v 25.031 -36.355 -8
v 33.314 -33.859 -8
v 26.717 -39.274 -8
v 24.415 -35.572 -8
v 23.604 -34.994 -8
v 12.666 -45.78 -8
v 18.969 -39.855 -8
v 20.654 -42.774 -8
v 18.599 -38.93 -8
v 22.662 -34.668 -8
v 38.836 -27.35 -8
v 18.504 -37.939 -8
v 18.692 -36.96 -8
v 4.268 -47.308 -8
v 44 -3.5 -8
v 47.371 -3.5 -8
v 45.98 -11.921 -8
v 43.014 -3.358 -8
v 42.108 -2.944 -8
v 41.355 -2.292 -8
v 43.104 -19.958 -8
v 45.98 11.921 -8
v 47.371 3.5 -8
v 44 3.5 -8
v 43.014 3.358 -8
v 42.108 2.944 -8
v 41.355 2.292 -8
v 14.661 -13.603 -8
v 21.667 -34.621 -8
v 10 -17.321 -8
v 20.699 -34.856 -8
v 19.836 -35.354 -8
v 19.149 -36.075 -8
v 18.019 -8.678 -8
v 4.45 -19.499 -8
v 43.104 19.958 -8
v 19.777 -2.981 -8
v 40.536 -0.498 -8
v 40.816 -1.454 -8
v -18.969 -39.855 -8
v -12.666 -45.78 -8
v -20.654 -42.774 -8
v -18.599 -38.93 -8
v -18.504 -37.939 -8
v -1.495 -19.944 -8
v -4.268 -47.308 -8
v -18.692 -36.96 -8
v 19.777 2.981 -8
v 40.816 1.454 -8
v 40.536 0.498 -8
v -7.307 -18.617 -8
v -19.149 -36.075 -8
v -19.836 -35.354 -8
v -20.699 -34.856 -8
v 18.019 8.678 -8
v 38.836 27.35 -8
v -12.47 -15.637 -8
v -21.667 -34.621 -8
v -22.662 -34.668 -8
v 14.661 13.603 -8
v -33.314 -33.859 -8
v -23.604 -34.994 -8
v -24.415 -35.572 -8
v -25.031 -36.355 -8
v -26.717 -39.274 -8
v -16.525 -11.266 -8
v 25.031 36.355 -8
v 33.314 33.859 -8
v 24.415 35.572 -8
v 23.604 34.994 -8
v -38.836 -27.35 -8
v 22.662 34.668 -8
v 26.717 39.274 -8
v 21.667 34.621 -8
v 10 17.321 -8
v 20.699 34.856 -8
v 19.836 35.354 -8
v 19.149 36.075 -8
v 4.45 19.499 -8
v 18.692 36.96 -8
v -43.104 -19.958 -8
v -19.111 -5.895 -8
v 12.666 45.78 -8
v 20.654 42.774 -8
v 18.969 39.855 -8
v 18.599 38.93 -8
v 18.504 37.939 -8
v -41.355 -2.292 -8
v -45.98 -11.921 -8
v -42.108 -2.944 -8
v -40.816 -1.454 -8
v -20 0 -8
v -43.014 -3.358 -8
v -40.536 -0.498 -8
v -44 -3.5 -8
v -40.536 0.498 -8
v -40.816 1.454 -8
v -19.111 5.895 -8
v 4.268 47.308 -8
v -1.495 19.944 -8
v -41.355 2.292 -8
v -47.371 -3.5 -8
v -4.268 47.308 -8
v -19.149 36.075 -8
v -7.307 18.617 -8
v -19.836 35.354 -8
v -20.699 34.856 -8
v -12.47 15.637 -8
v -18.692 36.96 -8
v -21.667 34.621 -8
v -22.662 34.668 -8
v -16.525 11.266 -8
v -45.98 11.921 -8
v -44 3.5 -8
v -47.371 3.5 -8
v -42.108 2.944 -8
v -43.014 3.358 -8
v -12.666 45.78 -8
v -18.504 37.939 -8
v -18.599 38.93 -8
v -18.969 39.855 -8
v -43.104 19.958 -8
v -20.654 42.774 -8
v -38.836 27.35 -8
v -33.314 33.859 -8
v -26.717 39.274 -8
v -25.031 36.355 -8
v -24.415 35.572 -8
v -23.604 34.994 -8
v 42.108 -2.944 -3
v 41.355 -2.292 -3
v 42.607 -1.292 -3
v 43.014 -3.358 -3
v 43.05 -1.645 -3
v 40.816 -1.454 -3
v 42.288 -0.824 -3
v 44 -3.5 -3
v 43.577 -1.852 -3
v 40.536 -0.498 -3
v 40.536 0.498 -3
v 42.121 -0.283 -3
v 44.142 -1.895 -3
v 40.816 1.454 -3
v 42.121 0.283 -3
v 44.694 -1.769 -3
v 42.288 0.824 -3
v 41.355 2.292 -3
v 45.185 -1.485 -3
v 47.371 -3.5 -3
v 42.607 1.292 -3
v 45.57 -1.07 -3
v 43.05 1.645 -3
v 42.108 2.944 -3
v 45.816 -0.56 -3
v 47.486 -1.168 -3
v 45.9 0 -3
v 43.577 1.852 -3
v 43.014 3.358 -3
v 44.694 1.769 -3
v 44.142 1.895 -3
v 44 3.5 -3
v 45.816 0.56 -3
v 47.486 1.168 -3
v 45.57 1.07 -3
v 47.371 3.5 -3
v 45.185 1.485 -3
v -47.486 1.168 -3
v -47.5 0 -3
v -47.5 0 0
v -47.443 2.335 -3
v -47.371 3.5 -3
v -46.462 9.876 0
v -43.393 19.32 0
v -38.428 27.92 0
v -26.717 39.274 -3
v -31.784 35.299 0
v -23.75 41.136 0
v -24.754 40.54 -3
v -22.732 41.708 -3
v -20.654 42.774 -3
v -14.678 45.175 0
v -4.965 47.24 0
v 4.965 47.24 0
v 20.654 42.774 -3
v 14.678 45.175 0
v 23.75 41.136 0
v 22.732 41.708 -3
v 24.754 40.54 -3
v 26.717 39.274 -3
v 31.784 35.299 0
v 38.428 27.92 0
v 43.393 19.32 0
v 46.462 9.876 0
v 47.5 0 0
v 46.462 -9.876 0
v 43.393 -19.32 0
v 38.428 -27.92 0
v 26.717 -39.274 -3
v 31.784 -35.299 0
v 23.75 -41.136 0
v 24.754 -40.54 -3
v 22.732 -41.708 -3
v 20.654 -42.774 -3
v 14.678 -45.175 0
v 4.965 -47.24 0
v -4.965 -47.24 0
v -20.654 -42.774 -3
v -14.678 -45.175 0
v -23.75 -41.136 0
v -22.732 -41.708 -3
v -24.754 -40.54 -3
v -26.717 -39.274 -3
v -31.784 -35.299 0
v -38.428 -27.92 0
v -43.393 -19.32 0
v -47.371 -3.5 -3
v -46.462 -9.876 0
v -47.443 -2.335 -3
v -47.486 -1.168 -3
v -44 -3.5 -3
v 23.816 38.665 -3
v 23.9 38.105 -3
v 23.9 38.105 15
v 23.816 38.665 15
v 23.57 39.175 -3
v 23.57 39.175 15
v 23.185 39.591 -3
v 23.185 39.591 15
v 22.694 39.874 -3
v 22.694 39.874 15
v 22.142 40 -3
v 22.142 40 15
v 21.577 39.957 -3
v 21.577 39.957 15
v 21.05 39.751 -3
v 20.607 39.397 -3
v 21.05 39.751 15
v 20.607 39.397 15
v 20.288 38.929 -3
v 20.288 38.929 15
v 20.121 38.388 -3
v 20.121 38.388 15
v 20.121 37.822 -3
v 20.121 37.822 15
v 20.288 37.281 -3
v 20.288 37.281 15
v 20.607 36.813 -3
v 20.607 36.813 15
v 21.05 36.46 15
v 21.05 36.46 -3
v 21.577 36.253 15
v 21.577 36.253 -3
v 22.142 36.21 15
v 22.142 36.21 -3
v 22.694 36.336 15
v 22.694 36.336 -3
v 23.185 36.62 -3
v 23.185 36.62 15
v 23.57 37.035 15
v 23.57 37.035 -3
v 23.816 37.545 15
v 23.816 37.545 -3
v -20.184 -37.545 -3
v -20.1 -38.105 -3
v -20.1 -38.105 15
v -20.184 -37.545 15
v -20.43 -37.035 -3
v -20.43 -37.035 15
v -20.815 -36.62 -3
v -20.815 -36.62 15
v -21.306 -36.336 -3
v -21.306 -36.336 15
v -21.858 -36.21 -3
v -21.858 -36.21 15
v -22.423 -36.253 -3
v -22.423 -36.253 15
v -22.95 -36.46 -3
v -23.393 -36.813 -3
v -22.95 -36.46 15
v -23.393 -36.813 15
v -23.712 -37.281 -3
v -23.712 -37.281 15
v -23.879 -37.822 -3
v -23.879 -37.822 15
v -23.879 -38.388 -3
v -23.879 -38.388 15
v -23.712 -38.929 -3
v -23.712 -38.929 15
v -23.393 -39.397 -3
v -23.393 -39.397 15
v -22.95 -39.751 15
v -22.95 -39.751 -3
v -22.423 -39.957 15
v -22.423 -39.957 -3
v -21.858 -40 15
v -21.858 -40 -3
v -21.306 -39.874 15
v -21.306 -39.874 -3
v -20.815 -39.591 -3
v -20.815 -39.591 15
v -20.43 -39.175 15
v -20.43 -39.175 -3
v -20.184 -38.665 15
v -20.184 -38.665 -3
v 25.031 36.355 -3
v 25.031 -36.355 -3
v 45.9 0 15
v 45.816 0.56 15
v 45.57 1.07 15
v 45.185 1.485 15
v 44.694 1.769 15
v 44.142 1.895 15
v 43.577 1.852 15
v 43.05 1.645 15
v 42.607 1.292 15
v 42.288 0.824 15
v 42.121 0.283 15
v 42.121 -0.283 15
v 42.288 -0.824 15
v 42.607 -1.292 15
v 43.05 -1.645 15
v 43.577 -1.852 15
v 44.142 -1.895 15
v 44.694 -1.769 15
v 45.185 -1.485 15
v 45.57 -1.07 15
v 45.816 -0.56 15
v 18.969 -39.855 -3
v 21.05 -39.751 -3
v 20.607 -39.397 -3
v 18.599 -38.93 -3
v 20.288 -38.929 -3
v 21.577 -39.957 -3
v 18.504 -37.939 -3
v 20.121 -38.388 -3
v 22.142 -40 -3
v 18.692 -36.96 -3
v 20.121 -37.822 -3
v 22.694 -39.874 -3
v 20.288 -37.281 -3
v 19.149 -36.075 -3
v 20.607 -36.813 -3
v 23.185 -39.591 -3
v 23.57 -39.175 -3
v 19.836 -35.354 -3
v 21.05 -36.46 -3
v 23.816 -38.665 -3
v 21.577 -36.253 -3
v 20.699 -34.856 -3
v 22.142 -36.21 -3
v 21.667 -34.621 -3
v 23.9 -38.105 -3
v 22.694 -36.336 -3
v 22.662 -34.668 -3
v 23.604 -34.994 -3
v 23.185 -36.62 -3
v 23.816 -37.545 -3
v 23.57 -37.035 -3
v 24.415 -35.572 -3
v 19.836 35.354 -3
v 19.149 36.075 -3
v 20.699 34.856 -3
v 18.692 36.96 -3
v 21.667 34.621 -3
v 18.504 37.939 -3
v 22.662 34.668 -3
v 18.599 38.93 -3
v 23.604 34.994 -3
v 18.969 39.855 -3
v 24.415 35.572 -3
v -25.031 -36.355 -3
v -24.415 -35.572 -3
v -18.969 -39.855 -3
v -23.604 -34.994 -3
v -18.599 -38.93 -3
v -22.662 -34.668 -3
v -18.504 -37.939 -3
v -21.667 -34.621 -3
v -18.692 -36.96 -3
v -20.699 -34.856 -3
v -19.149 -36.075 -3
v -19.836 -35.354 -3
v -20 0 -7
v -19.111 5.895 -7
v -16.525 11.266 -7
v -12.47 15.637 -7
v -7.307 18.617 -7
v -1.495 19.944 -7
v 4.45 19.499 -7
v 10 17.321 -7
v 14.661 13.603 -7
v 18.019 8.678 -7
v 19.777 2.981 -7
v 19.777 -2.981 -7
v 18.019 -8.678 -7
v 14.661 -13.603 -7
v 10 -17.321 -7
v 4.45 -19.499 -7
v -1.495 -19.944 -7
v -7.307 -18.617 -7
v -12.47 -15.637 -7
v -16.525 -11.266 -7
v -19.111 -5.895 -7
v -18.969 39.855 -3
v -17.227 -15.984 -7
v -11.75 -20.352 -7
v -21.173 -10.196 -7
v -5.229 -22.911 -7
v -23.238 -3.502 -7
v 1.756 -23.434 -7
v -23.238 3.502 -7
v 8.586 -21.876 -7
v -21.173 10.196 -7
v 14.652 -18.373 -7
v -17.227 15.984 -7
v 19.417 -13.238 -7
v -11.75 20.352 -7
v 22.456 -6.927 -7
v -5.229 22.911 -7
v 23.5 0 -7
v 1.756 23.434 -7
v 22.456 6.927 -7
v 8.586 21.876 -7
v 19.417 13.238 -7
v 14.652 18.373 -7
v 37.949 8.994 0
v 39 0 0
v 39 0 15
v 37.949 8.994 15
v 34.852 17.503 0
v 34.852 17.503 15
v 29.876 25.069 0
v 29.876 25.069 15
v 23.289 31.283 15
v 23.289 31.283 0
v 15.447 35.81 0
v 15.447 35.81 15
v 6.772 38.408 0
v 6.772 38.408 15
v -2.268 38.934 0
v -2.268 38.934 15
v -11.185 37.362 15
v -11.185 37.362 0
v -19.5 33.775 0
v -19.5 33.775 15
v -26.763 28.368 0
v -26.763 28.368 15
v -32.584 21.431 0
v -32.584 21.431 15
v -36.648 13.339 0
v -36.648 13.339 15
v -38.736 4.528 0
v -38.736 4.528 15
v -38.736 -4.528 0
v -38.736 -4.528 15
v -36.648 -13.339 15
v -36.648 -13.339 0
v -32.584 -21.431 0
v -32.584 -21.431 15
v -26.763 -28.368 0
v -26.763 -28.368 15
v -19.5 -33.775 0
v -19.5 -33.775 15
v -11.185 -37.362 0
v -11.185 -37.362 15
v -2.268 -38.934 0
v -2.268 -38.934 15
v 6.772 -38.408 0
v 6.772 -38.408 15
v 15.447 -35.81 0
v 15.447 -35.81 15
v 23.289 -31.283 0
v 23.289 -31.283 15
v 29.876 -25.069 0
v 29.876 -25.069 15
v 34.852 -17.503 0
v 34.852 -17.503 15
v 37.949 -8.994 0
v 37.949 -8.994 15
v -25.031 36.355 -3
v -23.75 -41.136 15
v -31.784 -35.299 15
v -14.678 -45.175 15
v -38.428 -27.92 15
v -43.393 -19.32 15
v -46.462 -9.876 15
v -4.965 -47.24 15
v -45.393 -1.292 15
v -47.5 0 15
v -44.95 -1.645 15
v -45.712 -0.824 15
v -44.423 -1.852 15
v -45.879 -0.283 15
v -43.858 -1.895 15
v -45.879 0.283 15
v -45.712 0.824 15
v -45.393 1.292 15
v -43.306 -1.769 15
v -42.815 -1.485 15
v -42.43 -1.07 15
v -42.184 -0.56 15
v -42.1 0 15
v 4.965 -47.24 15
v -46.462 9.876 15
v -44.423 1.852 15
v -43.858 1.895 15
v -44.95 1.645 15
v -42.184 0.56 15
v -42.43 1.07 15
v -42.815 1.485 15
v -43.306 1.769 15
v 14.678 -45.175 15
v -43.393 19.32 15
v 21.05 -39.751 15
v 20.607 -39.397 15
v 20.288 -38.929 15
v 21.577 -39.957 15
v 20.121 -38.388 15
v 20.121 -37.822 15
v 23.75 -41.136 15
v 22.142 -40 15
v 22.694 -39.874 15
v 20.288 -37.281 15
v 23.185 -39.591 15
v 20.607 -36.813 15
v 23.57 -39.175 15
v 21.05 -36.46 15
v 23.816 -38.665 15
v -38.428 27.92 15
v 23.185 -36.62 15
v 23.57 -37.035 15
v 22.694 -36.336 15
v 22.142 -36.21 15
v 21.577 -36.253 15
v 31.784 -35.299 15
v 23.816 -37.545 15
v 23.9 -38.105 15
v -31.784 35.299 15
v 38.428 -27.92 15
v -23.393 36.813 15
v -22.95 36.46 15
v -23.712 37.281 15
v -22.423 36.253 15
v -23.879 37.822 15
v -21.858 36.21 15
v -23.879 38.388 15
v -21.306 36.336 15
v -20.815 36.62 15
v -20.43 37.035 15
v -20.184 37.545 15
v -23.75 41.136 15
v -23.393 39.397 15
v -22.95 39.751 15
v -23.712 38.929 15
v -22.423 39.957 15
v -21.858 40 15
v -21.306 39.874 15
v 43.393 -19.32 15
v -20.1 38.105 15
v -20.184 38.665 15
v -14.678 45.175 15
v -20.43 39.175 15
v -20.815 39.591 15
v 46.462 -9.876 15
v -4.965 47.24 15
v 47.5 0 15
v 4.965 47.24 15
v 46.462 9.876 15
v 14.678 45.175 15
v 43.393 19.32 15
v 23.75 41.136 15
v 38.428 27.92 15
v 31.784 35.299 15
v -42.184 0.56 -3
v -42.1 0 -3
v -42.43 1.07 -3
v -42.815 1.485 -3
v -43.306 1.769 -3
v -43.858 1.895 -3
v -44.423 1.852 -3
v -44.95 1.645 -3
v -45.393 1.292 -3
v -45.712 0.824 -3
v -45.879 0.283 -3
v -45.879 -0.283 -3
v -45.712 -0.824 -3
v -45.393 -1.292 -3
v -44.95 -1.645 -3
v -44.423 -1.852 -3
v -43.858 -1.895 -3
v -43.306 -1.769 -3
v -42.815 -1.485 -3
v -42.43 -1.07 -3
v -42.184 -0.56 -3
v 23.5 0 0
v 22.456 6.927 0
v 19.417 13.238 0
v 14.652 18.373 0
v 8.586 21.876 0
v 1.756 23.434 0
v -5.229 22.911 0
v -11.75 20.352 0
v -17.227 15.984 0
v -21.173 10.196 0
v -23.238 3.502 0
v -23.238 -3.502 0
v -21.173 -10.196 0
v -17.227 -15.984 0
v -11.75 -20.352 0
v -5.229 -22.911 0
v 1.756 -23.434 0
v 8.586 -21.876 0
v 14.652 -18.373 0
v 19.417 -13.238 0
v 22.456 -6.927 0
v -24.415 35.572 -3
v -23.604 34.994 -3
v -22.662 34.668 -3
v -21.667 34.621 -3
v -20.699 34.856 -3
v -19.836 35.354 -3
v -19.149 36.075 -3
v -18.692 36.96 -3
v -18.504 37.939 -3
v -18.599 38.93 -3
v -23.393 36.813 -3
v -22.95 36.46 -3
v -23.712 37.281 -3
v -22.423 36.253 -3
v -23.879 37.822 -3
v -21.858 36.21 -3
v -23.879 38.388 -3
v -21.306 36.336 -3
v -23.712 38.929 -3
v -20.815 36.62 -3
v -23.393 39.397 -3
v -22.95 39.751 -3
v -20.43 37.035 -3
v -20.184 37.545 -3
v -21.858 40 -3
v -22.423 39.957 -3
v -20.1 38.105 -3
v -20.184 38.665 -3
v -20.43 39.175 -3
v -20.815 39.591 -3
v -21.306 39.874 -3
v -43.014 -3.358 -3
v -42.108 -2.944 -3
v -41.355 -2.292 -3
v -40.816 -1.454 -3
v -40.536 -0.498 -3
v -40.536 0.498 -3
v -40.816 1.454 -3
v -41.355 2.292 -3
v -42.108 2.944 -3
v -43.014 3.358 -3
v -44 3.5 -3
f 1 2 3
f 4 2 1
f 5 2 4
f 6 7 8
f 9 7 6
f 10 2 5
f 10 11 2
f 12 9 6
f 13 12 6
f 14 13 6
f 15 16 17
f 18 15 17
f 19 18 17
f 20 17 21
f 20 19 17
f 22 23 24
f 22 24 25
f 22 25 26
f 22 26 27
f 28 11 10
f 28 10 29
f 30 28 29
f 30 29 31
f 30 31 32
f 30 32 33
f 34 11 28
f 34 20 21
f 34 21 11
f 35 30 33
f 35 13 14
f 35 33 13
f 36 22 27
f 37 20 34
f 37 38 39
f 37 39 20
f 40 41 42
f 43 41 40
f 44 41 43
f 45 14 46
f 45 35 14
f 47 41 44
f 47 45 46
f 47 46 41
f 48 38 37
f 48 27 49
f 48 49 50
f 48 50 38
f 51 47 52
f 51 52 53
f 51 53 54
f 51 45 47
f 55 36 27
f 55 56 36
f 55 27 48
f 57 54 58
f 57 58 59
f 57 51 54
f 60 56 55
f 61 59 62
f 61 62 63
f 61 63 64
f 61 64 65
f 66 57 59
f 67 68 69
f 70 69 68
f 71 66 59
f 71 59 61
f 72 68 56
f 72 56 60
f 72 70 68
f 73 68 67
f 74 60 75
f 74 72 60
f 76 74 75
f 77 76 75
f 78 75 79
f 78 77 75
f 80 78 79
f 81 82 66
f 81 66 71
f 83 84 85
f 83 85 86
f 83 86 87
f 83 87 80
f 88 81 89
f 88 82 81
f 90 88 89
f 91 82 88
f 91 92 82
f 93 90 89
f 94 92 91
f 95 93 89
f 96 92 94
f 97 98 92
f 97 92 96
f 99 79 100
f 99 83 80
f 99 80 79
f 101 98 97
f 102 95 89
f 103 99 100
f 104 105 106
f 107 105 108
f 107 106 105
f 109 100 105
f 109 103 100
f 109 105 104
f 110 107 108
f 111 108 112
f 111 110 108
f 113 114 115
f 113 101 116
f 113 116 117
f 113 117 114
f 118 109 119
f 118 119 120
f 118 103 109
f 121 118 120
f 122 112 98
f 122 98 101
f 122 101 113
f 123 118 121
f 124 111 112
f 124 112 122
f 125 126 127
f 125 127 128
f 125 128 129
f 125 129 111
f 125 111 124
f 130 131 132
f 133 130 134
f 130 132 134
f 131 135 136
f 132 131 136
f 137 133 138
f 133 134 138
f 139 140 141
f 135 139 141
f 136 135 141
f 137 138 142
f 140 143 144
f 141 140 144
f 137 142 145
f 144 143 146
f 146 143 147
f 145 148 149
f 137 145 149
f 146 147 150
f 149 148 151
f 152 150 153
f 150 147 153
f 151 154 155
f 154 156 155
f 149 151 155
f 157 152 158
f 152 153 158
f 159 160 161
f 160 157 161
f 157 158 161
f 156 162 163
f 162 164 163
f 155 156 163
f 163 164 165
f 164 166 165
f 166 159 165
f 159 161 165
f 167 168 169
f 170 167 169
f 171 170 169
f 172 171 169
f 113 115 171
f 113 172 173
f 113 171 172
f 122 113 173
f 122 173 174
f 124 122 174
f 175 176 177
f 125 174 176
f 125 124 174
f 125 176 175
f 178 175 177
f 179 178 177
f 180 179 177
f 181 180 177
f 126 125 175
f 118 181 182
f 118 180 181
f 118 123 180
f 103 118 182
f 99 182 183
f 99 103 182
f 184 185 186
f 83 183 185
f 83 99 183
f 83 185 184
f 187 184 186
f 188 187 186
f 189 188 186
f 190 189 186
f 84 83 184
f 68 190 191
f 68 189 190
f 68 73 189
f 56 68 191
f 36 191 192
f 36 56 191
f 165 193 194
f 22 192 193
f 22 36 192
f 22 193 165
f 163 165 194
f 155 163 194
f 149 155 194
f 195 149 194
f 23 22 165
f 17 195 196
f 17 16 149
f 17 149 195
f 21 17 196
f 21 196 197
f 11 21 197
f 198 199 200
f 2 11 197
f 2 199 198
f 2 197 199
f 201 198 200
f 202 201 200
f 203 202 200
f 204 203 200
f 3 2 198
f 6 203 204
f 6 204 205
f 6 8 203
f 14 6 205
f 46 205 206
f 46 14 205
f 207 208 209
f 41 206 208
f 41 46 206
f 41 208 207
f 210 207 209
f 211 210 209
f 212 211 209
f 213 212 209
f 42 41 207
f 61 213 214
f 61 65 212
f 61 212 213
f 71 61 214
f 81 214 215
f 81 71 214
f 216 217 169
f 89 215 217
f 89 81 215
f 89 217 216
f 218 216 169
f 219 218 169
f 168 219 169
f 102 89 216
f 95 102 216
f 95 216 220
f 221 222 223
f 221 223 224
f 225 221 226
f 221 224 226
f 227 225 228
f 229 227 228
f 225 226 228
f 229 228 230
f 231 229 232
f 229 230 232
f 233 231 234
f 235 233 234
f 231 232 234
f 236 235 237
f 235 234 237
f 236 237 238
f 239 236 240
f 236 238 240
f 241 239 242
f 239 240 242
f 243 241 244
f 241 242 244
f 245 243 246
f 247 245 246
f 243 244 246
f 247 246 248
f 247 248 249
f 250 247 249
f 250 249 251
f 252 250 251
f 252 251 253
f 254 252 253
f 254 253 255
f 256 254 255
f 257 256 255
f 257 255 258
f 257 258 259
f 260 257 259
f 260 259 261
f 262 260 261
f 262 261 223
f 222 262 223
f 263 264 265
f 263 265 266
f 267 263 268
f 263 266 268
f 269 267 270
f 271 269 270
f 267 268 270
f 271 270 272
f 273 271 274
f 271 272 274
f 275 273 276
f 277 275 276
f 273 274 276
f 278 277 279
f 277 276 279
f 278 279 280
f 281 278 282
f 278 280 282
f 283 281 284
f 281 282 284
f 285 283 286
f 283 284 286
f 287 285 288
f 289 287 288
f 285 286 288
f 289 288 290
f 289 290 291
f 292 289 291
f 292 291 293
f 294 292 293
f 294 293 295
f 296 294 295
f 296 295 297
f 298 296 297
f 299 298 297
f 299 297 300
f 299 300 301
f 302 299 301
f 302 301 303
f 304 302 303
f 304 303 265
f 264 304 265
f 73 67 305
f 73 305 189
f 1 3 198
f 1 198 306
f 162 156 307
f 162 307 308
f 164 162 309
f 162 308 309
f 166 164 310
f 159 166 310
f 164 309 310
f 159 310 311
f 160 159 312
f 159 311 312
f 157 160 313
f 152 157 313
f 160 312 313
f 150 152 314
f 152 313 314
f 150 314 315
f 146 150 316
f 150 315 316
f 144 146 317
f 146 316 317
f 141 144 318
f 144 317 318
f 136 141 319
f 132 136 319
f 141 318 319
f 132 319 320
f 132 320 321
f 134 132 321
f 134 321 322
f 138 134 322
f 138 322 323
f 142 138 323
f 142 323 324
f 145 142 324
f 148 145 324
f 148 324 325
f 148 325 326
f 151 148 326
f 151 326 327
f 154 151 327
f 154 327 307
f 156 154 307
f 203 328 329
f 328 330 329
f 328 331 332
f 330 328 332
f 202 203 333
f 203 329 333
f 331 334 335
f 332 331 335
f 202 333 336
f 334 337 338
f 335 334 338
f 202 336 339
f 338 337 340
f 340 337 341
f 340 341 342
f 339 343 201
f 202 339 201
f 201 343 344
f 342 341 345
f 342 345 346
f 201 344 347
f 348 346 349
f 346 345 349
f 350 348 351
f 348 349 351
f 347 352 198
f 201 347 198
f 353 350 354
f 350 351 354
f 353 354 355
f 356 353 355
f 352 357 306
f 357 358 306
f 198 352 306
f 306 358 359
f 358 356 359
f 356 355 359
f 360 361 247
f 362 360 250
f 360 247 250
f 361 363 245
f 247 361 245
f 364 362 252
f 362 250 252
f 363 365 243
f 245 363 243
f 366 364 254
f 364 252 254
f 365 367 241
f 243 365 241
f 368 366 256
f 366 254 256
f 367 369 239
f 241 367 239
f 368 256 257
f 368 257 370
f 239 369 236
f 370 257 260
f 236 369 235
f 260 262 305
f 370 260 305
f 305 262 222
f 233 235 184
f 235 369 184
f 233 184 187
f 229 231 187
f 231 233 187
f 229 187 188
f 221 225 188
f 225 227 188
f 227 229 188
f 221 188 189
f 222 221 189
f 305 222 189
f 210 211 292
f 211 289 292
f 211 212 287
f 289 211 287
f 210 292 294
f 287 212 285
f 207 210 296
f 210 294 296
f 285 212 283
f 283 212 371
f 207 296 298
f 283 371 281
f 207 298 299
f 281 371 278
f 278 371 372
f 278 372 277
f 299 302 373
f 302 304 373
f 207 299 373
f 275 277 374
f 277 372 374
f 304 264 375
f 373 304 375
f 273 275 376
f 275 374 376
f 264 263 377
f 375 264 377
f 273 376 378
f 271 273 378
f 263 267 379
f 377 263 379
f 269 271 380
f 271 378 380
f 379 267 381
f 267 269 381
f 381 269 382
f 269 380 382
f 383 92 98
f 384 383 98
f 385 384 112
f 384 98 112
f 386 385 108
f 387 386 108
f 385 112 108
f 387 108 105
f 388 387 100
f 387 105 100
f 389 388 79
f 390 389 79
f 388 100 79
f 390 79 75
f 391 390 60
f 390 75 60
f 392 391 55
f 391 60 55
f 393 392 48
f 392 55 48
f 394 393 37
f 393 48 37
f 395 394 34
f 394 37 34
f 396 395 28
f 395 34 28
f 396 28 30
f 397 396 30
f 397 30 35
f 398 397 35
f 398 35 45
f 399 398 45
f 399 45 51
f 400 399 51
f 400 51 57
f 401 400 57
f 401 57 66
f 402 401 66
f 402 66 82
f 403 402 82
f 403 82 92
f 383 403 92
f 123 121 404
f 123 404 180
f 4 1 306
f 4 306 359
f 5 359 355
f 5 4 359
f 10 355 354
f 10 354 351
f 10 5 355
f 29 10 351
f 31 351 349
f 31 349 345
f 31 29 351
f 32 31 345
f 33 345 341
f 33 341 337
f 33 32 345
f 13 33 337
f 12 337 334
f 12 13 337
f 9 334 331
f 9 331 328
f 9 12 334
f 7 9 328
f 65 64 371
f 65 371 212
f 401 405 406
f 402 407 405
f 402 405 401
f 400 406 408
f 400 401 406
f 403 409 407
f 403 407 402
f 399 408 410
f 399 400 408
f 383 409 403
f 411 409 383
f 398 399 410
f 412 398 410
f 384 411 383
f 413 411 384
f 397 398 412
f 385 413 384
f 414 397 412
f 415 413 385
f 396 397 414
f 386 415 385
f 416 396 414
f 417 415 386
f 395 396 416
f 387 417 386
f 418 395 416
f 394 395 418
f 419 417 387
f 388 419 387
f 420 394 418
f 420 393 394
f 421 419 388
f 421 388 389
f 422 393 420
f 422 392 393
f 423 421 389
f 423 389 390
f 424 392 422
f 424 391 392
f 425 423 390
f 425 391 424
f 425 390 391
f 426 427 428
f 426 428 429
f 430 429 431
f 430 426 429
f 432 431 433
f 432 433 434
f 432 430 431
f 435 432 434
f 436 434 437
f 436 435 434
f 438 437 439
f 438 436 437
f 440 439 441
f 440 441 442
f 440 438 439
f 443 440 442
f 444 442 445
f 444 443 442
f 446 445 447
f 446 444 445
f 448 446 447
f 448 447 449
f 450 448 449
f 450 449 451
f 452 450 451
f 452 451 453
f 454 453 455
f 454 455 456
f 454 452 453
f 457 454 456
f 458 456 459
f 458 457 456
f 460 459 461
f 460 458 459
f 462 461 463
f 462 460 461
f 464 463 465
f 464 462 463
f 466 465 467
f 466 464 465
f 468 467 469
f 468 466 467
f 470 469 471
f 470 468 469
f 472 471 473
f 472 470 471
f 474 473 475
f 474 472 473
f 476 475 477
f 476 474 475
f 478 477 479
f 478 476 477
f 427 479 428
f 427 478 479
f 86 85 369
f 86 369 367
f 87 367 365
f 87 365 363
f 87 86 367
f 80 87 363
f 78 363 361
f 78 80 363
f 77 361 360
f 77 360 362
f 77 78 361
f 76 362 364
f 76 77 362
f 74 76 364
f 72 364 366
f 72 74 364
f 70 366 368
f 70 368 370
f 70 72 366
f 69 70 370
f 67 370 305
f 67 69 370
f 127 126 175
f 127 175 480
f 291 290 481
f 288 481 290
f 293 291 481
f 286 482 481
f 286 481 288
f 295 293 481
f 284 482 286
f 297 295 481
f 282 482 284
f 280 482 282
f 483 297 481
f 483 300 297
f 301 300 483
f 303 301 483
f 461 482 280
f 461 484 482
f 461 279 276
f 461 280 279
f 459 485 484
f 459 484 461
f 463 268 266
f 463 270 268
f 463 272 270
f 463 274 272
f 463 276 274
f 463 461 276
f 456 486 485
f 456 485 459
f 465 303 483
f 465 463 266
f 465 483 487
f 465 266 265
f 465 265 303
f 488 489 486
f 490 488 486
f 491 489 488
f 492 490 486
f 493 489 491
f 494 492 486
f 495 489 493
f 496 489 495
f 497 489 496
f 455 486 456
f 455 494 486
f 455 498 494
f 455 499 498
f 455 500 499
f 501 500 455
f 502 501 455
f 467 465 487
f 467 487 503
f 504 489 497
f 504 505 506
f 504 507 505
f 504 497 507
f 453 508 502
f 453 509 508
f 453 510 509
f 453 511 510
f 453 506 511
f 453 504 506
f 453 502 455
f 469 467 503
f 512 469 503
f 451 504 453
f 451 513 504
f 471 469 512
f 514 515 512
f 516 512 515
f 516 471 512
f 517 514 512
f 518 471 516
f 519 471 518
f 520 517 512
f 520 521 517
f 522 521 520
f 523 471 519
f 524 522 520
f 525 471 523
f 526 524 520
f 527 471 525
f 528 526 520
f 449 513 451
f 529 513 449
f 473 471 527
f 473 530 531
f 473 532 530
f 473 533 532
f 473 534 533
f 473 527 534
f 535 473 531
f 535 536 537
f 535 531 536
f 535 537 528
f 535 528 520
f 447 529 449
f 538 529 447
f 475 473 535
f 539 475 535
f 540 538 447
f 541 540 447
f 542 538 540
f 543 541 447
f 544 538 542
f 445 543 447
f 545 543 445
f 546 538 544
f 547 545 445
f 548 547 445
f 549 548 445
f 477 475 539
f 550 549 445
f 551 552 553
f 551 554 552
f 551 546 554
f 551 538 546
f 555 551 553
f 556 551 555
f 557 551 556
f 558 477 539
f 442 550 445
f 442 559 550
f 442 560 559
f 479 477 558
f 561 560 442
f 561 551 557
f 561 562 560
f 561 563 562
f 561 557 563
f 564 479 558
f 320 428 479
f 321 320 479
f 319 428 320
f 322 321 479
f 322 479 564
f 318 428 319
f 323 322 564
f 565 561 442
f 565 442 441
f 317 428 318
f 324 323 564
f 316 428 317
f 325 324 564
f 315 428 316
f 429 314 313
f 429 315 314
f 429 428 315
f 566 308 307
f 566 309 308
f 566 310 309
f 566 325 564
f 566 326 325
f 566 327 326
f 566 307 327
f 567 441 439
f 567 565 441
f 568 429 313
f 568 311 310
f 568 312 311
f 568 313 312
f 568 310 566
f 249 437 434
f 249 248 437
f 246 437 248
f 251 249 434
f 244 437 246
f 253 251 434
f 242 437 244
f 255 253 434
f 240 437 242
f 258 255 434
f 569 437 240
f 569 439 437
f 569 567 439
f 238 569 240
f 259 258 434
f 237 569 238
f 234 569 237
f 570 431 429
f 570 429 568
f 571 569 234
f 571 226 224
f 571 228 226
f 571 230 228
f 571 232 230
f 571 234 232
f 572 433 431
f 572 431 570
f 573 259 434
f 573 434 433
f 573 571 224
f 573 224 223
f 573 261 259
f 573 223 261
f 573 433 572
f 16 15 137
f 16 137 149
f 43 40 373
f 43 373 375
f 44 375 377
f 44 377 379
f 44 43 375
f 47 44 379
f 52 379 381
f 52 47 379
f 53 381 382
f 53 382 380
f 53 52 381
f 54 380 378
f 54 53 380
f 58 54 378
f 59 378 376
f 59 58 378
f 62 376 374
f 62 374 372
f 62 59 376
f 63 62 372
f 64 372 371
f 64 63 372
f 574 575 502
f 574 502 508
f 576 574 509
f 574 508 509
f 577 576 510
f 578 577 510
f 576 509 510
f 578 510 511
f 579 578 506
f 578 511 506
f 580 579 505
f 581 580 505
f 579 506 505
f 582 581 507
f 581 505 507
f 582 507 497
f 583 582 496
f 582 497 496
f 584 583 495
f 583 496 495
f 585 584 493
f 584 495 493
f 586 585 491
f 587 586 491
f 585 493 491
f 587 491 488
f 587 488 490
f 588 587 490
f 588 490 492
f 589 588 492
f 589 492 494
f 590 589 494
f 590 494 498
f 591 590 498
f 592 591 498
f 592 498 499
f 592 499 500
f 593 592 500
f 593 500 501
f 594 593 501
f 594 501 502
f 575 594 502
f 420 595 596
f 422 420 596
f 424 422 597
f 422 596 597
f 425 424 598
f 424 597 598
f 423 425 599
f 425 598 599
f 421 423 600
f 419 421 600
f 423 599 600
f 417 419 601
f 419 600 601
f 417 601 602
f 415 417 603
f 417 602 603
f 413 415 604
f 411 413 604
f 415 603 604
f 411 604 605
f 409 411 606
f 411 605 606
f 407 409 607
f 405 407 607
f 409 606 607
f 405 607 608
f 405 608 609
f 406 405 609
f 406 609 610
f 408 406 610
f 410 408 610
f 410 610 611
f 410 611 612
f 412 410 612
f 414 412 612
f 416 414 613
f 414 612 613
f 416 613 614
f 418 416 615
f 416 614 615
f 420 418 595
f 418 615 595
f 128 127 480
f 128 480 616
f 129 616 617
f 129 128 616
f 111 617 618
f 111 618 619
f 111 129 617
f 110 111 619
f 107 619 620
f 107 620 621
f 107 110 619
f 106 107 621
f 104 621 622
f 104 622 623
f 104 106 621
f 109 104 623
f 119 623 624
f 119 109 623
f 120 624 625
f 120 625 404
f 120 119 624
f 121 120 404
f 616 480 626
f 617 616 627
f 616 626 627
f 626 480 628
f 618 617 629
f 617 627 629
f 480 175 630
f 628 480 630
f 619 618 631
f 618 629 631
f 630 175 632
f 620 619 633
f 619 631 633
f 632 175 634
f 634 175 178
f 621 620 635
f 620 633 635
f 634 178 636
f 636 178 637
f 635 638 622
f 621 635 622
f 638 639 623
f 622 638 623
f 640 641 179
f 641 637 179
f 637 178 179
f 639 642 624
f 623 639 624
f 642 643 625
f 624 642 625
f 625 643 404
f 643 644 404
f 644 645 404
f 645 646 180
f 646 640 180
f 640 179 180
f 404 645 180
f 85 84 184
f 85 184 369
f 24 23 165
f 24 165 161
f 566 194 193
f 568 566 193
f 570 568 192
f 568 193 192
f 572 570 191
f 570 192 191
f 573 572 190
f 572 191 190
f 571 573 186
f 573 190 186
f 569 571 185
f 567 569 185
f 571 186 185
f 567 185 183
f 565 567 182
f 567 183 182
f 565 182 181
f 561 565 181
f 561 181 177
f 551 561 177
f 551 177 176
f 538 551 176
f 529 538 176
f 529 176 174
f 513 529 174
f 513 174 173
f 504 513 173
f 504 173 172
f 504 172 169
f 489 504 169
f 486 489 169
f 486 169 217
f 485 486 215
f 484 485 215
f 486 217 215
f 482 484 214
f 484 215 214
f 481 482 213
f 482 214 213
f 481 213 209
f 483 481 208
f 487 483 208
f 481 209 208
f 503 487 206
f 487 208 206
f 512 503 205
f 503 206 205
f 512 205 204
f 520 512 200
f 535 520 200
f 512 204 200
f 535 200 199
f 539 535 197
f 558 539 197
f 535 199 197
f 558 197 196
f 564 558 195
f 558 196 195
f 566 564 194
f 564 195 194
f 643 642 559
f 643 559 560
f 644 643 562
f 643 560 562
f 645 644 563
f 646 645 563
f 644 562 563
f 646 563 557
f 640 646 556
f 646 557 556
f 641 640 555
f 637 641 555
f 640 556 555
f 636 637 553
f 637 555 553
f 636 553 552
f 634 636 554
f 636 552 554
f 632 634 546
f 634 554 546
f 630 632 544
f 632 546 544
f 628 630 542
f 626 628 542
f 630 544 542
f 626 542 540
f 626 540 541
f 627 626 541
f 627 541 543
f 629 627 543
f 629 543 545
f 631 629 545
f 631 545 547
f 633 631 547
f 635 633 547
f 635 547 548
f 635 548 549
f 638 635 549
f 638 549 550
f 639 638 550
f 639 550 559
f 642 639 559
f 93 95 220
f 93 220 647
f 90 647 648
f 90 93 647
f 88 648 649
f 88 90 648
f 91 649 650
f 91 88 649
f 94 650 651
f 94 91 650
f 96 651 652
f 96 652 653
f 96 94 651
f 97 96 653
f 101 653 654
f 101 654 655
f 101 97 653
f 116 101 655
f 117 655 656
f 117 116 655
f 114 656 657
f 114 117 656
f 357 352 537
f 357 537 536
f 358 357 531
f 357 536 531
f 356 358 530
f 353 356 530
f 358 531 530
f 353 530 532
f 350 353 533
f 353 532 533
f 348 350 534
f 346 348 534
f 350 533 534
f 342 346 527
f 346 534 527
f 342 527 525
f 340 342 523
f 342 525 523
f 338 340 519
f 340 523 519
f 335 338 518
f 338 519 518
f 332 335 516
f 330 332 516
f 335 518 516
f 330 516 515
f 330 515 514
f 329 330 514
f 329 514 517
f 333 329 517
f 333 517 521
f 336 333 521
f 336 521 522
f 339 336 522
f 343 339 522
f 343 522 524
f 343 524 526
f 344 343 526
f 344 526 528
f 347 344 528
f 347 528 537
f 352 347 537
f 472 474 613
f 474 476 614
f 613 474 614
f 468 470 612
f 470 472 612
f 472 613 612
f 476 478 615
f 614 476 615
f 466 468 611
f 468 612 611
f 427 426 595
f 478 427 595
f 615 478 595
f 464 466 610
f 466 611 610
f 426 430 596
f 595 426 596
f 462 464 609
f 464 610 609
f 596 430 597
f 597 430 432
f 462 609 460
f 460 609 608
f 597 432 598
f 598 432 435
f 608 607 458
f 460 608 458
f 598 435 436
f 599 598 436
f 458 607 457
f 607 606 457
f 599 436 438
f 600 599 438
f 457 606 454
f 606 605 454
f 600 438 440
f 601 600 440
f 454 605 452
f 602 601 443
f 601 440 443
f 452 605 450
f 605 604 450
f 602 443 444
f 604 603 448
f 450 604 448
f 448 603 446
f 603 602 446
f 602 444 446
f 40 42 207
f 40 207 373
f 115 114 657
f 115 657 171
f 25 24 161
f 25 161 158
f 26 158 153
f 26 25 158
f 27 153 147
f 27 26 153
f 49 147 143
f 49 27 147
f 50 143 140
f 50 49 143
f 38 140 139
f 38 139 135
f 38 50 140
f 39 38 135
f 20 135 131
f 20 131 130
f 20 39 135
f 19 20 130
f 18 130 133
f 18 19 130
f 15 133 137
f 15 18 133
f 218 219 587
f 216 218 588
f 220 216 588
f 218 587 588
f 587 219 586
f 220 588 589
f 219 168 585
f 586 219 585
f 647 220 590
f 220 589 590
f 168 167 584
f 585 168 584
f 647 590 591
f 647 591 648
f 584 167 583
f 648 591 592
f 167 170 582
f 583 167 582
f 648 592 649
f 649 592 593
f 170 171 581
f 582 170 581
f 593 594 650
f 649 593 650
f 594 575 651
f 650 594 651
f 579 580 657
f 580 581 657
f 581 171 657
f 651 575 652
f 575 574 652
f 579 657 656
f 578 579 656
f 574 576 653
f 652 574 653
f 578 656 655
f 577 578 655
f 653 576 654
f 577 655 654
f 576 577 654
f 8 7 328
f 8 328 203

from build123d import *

# Parameters (mm, degrees)
SKETCH1_R           = 47.5
SKETCH1_R_2         = 39
BOSS_EXTRUDE1_DEPTH = 15
BOSS_EXTRUDE2_START = 8
SKETCH4_R           = 47.5
SKETCH4_R_2         = 20
BOSS_EXTRUDE2_DEPTH = 8
SKETCH5_R           = 23.5
CUT_EXTRUDE3_DEPTH  = 7
SKETCH6_R           = 1.9
CUT_EXTRUDE4_DEPTH  = 72.003521039
CUT_EXTRUDE5_DEPTH  = 5


with BuildPart() as part:
    # Sketch1 → Boss-Extrude1 (new body)
    with BuildSketch(Plane.XY):
        Circle(SKETCH1_R)
        Circle(SKETCH1_R_2, mode=Mode.SUBTRACT)
    extrude(amount=BOSS_EXTRUDE1_DEPTH)

    # Sketch4 → Boss-Extrude2 (add)
    with BuildSketch(Plane(origin=(0, 0, 0), x_dir=(-1, 0, 0), z_dir=(0, 0, -1)).offset(BOSS_EXTRUDE2_START)):
        Circle(SKETCH4_R)
        Circle(SKETCH4_R_2, mode=Mode.SUBTRACT)
    extrude(amount=-BOSS_EXTRUDE2_DEPTH)

    # Sketch5 → Cut-Extrude3 (cut)
    with BuildSketch(Plane.XY):
        Circle(SKETCH5_R)
    extrude(amount=-CUT_EXTRUDE3_DEPTH, mode=Mode.SUBTRACT)

    # Sketch6 → Cut-Extrude4 (cut, through all)
    with BuildSketch(Plane.XY.offset(15)):
        with Locations((44, 0)):
            Circle(SKETCH6_R)
        with Locations((22, -38.105117767)):
            Circle(SKETCH6_R)
        with Locations((-22, -38.105117767)):
            Circle(SKETCH6_R)
        with Locations((-44, 0)):
            Circle(SKETCH6_R)
        with Locations((-22, 38.105117767)):
            Circle(SKETCH6_R)
        with Locations((22, 38.105117767)):
            Circle(SKETCH6_R)
    extrude(amount=-CUT_EXTRUDE4_DEPTH, mode=Mode.SUBTRACT)

    # Sketch7 → Cut-Extrude5 (cut)
    with BuildSketch(Plane(origin=(0, 0, -8), x_dir=(-1, 0, 0), z_dir=(0, 0, -1))):
        with BuildLine():
            Line((44, 3.5), (47.370877129, 3.5))
            ThreePointArc((47.370877129, 3.5), (47.5, 0), (47.370877129, -3.5))
            Line((47.370877129, -3.5), (44, -3.5))
            ThreePointArc((44, -3.5), (40.5, 0), (44, 3.5))
        make_face()
        with BuildLine():
            Line((25.031088913, -36.355117767), (26.716527478, -39.274382994))
            ThreePointArc((26.716527478, -39.274382994), (23.75, -41.13620668), (20.654349651, -42.774382994))
            Line((20.654349651, -42.774382994), (18.968911087, -39.855117767))
            ThreePointArc((18.968911087, -39.855117767), (20.25, -35.074028853), (25.031088913, -36.355117767))
        make_face()
        with BuildLine():
            Line((-18.968911087, -39.855117767), (-20.654349651, -42.774382994))
            ThreePointArc((-20.654349651, -42.774382994), (-23.75, -41.13620668), (-26.716527478, -39.274382994))
            Line((-26.716527478, -39.274382994), (-25.031088913, -36.355117767))
            ThreePointArc((-25.031088913, -36.355117767), (-20.25, -35.074028853), (-18.968911087, -39.855117767))
        make_face()
        with BuildLine():
            Line((-44, -3.5), (-47.370877129, -3.5))
            ThreePointArc((-47.370877129, -3.5), (-47.5, 0), (-47.370877129, 3.5))
            Line((-47.370877129, 3.5), (-44, 3.5))
            ThreePointArc((-44, 3.5), (-40.5, 0), (-44, -3.5))
        make_face()
        with BuildLine():
            Line((-25.031088913, 36.355117767), (-26.716527478, 39.274382994))
            ThreePointArc((-26.716527478, 39.274382994), (-23.75, 41.13620668), (-20.654349651, 42.774382994))
            Line((-20.654349651, 42.774382994), (-18.968911087, 39.855117767))
            ThreePointArc((-18.968911087, 39.855117767), (-20.25, 35.074028853), (-25.031088913, 36.355117767))
        make_face()
        with BuildLine():
            Line((18.968911087, 39.855117767), (20.654349651, 42.774382994))
            ThreePointArc((20.654349651, 42.774382994), (23.75, 41.13620668), (26.716527478, 39.274382994))
            Line((26.716527478, 39.274382994), (25.031088913, 36.355117767))
            ThreePointArc((25.031088913, 36.355117767), (20.25, 35.074028853), (18.968911087, 39.855117767))
        make_face()
    extrude(amount=-CUT_EXTRUDE5_DEPTH, mode=Mode.SUBTRACT)


solid = part.part
